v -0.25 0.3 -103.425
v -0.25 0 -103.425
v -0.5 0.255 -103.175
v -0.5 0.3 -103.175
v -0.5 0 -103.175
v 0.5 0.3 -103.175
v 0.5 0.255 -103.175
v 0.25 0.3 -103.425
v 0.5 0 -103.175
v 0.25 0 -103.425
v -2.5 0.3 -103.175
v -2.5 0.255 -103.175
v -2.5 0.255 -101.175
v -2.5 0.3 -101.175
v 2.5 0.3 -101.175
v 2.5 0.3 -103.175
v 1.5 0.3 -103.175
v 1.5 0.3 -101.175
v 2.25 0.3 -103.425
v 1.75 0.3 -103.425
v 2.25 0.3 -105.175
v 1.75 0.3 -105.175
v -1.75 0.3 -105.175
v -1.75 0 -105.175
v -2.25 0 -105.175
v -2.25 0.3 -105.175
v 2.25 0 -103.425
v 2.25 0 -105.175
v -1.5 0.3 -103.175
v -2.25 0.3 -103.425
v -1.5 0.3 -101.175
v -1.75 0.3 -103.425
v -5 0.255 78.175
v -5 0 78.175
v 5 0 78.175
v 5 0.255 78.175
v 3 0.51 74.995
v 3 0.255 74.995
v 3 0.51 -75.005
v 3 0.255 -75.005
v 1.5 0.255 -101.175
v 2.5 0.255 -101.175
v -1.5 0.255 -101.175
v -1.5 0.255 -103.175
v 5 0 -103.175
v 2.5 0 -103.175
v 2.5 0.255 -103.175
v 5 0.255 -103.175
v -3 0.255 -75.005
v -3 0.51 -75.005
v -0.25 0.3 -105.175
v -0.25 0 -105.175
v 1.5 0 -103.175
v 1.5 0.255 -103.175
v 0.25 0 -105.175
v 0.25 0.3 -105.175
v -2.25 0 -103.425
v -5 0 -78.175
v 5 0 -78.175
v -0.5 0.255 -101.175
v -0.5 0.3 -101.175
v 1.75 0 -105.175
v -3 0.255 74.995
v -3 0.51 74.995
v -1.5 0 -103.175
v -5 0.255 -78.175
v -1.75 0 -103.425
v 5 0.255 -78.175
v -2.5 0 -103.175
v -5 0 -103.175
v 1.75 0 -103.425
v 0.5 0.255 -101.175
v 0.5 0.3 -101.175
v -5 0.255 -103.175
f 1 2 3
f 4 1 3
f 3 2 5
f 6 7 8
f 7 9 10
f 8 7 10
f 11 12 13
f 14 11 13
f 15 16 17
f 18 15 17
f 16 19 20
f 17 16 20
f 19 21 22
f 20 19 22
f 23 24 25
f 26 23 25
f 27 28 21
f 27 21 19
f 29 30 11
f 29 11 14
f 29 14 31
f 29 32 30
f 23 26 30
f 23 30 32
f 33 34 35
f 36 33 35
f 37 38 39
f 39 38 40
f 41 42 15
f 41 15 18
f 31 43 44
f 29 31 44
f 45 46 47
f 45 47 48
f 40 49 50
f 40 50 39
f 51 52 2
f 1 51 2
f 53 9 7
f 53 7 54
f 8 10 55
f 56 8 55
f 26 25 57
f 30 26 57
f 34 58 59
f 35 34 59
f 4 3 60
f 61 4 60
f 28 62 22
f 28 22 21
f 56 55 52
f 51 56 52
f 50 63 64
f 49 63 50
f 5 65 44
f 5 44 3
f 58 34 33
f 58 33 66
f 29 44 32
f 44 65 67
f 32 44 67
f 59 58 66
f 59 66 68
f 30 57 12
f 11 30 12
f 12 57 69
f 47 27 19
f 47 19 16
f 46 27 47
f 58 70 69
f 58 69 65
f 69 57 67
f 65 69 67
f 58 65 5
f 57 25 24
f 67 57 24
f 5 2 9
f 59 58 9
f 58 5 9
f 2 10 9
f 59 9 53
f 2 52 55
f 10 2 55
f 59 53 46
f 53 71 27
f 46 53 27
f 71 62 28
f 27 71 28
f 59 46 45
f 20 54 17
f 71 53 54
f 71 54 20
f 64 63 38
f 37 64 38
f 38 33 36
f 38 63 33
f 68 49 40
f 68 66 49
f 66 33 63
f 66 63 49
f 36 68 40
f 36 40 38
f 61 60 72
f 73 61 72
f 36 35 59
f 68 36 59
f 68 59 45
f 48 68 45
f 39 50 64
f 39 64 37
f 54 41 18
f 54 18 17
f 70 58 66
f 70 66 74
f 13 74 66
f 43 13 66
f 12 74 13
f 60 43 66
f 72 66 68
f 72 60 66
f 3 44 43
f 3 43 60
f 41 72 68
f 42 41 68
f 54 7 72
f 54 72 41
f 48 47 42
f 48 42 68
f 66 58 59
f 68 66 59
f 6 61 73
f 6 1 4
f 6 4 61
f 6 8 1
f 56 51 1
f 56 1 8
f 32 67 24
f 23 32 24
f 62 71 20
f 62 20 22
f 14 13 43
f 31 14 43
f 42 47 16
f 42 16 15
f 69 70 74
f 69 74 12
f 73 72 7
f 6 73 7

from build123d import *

# Parameters (mm, degrees)
SKETCH1_W           = 10
SKETCH1_H           = 156.35
BOSS_EXTRUDE1_DEPTH = 0.255
SKETCH2_W           = 6
SKETCH2_H           = 150
BOSS_EXTRUDE2_DEPTH = 0.255
SKETCH3_W           = 10
SKETCH3_H           = 25
BOSS_EXTRUDE4_DEPTH = 0.255
BOSS_EXTRUDE5_DEPTH = 0.3


with BuildPart() as part:
    # Sketch1 → Boss-Extrude1 (new body)
    with BuildSketch(Plane(origin=(0, 0, 0), x_dir=(1, 0, 0), z_dir=(0, 1, 0))):
        Rectangle(SKETCH1_W, SKETCH1_H)
    extrude(amount=BOSS_EXTRUDE1_DEPTH)

    # Sketch2 → Boss-Extrude2 (add)
    with BuildSketch(Plane(origin=(0, 0.255, 0), x_dir=(1, 0, 0), z_dir=(0, 1, 0))):
        with Locations((0, 0.005)):
            Rectangle(SKETCH2_W, SKETCH2_H)
    extrude(amount=BOSS_EXTRUDE2_DEPTH)


with BuildPart() as body_2:
    # Sketch3 → Boss-Extrude4 (new body)
    with BuildSketch(Plane(origin=(0, 0, 0), x_dir=(1, 0, 0), z_dir=(0, 1, 0))):
        with Locations((0, 90.675)):
            Rectangle(SKETCH3_W, SKETCH3_H)
    extrude(amount=BOSS_EXTRUDE4_DEPTH)

    # Sketch6 → Boss-Extrude5 (add)
    with BuildSketch(Plane(origin=(0, 0, 0), x_dir=(1, 0, 0), z_dir=(0, 1, 0))):
        Polygon((-0.5, 101.175), (0.5, 101.175), (0.5, 103.175), (0.25, 103.425), (0.25, 105.175), (-0.25, 105.175), (-0.25, 103.425), (-0.5, 103.175), align=None)
        Polygon((2.25, 105.175), (2.25, 103.425), (2.5, 103.175), (2.5, 101.175), (1.5, 101.175), (1.5, 103.175), (1.75, 103.425), (1.75, 105.175), align=None)
        Polygon((-1.75, 105.175), (-2.25, 105.175), (-2.25, 103.425), (-2.5, 103.175), (-2.5, 101.175), (-1.5, 101.175), (-1.5, 103.175), (-1.75, 103.425), align=None)
    extrude(amount=BOSS_EXTRUDE5_DEPTH)


solid = Compound([part.part, body_2.part])
